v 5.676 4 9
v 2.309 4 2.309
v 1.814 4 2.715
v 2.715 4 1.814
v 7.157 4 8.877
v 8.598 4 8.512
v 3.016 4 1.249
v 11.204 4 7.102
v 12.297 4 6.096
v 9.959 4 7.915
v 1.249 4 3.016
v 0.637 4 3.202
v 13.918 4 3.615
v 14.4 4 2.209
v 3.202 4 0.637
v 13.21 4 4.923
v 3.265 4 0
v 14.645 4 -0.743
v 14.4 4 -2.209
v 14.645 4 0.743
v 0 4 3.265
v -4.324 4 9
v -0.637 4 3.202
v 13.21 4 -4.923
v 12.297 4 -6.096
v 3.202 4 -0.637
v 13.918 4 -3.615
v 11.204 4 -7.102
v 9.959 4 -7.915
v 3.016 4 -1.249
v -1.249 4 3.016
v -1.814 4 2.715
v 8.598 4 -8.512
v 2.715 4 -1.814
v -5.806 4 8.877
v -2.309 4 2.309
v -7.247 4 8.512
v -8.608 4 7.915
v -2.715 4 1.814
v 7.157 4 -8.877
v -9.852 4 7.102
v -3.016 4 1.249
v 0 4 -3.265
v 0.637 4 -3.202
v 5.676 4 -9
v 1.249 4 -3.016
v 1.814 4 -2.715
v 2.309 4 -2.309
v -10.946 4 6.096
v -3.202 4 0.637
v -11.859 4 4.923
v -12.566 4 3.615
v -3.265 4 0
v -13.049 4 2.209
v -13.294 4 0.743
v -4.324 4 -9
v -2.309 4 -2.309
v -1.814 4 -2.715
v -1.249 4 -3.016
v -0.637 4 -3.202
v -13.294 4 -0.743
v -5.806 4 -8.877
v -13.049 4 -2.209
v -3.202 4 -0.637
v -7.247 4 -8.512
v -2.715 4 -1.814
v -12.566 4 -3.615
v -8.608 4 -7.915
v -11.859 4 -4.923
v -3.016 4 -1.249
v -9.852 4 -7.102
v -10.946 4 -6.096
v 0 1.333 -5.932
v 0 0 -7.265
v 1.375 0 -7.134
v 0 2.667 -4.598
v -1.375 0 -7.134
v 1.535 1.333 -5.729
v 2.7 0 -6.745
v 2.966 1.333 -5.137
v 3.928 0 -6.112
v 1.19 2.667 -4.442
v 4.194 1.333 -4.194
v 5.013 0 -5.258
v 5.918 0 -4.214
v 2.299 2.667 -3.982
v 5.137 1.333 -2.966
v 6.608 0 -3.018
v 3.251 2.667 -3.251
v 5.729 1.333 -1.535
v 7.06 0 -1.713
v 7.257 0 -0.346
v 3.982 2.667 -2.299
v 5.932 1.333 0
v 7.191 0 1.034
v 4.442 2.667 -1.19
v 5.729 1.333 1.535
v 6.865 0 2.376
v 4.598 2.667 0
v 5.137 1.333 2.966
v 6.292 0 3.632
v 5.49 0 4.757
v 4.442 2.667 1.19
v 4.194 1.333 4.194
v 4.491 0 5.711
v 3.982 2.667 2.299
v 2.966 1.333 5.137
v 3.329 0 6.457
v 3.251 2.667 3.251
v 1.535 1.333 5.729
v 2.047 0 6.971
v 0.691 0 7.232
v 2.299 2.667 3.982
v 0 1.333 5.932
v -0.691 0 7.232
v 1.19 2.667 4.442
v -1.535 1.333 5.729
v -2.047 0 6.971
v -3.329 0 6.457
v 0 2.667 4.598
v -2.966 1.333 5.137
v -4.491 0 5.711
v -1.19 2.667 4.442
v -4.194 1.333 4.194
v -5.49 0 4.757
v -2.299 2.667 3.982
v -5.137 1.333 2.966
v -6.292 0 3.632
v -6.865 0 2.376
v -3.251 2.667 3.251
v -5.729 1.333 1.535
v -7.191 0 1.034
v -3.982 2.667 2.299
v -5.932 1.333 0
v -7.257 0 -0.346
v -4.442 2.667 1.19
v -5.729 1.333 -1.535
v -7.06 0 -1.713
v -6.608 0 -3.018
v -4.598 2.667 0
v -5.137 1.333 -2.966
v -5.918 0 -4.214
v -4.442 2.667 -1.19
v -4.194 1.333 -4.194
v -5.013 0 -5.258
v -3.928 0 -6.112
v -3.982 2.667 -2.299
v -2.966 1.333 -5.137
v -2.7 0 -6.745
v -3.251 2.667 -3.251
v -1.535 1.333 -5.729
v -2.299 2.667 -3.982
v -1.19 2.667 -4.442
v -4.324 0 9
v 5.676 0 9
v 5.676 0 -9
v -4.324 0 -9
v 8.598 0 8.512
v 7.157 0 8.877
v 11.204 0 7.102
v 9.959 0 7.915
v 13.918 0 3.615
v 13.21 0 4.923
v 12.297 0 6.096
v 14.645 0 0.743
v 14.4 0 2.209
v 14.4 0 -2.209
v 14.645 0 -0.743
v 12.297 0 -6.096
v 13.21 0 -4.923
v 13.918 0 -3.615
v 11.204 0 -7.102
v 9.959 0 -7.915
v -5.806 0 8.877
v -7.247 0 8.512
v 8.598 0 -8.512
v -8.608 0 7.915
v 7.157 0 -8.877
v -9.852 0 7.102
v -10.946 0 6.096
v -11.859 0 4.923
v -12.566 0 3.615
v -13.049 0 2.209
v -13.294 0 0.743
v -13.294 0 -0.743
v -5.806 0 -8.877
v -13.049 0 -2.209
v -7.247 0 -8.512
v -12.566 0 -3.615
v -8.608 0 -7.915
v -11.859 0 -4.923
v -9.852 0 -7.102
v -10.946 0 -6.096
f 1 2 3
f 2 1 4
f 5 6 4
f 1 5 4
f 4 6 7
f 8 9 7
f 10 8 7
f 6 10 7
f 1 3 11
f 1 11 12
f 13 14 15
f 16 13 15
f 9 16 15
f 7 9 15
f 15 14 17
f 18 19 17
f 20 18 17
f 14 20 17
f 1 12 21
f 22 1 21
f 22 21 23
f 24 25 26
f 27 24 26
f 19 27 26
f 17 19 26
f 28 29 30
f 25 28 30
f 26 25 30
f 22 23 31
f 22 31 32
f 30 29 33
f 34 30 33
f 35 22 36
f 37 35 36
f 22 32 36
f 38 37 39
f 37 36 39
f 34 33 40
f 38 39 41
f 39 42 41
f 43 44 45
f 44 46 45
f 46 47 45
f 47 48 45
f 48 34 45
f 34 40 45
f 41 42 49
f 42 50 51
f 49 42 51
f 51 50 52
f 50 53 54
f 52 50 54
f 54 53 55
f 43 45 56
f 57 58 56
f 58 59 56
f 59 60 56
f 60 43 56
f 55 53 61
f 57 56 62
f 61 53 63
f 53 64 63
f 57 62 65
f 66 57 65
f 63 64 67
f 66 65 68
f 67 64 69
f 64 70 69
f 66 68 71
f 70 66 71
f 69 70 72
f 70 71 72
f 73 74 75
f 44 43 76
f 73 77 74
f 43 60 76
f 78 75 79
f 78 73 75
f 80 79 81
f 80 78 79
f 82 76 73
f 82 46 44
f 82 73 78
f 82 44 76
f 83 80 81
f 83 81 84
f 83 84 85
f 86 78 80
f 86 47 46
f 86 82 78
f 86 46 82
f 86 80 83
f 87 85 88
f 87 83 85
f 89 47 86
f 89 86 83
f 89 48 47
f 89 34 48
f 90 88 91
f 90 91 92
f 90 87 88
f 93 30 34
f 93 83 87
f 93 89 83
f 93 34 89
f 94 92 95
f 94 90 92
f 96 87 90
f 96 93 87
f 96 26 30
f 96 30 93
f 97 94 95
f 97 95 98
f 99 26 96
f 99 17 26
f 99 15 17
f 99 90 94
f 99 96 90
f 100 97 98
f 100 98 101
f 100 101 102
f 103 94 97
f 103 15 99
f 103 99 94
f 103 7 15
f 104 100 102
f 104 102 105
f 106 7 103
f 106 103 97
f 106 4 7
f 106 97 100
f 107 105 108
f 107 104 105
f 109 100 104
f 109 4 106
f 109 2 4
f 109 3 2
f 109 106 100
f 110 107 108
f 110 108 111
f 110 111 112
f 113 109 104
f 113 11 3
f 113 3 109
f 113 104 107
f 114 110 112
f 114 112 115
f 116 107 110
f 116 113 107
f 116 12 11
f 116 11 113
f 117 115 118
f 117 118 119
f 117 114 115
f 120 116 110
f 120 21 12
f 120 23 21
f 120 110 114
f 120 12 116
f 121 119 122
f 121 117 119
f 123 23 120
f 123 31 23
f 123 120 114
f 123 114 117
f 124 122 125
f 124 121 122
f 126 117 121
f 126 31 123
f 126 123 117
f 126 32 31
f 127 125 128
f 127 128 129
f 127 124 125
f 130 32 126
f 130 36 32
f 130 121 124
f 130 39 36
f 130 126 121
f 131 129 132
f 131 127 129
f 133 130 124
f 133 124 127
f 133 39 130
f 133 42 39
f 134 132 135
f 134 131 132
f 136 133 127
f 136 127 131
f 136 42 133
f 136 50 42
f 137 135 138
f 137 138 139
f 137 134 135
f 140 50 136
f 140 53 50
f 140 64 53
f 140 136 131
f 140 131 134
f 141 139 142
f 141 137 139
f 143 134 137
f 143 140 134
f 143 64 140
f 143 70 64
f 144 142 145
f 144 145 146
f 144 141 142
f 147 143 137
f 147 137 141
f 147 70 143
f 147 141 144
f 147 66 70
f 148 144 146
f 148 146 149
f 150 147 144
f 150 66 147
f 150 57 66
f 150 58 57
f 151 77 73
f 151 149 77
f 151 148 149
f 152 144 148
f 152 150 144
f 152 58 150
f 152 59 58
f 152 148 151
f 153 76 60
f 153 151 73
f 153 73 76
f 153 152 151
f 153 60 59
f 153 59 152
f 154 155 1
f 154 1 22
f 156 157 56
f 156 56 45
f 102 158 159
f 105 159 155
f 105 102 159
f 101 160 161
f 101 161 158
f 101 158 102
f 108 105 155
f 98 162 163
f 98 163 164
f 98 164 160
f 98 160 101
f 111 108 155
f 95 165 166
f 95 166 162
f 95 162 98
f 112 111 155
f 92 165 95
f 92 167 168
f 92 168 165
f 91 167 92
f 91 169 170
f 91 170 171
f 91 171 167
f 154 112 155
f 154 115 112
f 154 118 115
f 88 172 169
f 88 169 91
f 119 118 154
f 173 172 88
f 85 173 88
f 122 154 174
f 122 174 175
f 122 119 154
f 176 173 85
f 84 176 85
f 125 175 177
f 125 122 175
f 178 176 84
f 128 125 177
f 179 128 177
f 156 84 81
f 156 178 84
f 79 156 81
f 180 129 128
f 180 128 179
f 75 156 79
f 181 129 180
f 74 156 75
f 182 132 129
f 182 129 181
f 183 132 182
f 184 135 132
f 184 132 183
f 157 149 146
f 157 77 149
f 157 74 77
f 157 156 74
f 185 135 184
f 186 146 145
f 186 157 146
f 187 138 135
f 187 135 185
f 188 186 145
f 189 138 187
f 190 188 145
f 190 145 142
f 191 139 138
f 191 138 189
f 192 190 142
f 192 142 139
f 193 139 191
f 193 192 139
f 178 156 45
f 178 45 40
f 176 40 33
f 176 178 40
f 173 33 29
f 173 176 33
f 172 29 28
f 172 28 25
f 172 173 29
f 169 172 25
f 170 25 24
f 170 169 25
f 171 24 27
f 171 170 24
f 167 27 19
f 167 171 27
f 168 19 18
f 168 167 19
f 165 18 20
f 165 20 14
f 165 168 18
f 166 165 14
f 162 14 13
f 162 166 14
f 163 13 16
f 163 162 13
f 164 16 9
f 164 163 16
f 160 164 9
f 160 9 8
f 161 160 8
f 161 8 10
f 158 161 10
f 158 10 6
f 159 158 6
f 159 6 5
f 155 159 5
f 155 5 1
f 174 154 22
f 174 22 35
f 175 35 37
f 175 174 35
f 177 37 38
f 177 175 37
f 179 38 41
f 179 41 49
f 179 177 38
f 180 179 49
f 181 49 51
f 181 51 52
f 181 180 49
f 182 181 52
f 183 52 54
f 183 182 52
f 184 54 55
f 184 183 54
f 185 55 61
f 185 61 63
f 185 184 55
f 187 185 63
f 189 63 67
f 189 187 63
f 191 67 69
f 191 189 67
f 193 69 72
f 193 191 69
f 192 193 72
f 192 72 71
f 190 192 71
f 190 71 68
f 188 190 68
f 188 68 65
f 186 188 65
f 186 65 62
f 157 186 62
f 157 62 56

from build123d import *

# Parameters (mm, degrees)
RESSALTO_EXTRUS_O1_DEPTH = 4
ESBO_O3_R                = 3.265
CORTE_EXTRUS_O1_DEPTH    = 10
CHANFRO1_SIZE            = 4


with BuildPart() as part:
    # Esboço2 → Ressalto-extrusão1 (new body)
    with BuildSketch(Plane(origin=(0, 0, 0), x_dir=(1, 0, 0), z_dir=(0, 1, 0))):
        with BuildLine():
            Line((-4.324324324, 9), (5.675675676, 9))
            ThreePointArc((5.675675676, 9), (14.675675676, 0), (5.675675676, -9))
            Line((5.675675676, -9), (-4.324324324, -9))
            ThreePointArc((-4.324324324, -9), (-13.324324324, 0), (-4.324324324, 9))
        make_face()
    extrude(amount=RESSALTO_EXTRUS_O1_DEPTH)

    # Esboço3 → Corte-extrusão1 (cut)
    with BuildSketch(Plane(origin=(0, 0, 0), x_dir=(-1, 0, 0), z_dir=(0, -1, 0))):
        with Locations(Location((0, 0, 0), (0, 0, 90))):
            Circle(ESBO_O3_R)
    extrude(amount=-CORTE_EXTRUS_O1_DEPTH, mode=Mode.SUBTRACT)

    # Chanfro1
    chanfro1_edges = [part.edges().sort_by_distance(p)[0] for p in [
        (0, 0, 3.265),
    ]]
    chamfer(chanfro1_edges, length=CHANFRO1_SIZE - 0.0001)  # a hair under: the kernel refuses the full size


solid = part.part
